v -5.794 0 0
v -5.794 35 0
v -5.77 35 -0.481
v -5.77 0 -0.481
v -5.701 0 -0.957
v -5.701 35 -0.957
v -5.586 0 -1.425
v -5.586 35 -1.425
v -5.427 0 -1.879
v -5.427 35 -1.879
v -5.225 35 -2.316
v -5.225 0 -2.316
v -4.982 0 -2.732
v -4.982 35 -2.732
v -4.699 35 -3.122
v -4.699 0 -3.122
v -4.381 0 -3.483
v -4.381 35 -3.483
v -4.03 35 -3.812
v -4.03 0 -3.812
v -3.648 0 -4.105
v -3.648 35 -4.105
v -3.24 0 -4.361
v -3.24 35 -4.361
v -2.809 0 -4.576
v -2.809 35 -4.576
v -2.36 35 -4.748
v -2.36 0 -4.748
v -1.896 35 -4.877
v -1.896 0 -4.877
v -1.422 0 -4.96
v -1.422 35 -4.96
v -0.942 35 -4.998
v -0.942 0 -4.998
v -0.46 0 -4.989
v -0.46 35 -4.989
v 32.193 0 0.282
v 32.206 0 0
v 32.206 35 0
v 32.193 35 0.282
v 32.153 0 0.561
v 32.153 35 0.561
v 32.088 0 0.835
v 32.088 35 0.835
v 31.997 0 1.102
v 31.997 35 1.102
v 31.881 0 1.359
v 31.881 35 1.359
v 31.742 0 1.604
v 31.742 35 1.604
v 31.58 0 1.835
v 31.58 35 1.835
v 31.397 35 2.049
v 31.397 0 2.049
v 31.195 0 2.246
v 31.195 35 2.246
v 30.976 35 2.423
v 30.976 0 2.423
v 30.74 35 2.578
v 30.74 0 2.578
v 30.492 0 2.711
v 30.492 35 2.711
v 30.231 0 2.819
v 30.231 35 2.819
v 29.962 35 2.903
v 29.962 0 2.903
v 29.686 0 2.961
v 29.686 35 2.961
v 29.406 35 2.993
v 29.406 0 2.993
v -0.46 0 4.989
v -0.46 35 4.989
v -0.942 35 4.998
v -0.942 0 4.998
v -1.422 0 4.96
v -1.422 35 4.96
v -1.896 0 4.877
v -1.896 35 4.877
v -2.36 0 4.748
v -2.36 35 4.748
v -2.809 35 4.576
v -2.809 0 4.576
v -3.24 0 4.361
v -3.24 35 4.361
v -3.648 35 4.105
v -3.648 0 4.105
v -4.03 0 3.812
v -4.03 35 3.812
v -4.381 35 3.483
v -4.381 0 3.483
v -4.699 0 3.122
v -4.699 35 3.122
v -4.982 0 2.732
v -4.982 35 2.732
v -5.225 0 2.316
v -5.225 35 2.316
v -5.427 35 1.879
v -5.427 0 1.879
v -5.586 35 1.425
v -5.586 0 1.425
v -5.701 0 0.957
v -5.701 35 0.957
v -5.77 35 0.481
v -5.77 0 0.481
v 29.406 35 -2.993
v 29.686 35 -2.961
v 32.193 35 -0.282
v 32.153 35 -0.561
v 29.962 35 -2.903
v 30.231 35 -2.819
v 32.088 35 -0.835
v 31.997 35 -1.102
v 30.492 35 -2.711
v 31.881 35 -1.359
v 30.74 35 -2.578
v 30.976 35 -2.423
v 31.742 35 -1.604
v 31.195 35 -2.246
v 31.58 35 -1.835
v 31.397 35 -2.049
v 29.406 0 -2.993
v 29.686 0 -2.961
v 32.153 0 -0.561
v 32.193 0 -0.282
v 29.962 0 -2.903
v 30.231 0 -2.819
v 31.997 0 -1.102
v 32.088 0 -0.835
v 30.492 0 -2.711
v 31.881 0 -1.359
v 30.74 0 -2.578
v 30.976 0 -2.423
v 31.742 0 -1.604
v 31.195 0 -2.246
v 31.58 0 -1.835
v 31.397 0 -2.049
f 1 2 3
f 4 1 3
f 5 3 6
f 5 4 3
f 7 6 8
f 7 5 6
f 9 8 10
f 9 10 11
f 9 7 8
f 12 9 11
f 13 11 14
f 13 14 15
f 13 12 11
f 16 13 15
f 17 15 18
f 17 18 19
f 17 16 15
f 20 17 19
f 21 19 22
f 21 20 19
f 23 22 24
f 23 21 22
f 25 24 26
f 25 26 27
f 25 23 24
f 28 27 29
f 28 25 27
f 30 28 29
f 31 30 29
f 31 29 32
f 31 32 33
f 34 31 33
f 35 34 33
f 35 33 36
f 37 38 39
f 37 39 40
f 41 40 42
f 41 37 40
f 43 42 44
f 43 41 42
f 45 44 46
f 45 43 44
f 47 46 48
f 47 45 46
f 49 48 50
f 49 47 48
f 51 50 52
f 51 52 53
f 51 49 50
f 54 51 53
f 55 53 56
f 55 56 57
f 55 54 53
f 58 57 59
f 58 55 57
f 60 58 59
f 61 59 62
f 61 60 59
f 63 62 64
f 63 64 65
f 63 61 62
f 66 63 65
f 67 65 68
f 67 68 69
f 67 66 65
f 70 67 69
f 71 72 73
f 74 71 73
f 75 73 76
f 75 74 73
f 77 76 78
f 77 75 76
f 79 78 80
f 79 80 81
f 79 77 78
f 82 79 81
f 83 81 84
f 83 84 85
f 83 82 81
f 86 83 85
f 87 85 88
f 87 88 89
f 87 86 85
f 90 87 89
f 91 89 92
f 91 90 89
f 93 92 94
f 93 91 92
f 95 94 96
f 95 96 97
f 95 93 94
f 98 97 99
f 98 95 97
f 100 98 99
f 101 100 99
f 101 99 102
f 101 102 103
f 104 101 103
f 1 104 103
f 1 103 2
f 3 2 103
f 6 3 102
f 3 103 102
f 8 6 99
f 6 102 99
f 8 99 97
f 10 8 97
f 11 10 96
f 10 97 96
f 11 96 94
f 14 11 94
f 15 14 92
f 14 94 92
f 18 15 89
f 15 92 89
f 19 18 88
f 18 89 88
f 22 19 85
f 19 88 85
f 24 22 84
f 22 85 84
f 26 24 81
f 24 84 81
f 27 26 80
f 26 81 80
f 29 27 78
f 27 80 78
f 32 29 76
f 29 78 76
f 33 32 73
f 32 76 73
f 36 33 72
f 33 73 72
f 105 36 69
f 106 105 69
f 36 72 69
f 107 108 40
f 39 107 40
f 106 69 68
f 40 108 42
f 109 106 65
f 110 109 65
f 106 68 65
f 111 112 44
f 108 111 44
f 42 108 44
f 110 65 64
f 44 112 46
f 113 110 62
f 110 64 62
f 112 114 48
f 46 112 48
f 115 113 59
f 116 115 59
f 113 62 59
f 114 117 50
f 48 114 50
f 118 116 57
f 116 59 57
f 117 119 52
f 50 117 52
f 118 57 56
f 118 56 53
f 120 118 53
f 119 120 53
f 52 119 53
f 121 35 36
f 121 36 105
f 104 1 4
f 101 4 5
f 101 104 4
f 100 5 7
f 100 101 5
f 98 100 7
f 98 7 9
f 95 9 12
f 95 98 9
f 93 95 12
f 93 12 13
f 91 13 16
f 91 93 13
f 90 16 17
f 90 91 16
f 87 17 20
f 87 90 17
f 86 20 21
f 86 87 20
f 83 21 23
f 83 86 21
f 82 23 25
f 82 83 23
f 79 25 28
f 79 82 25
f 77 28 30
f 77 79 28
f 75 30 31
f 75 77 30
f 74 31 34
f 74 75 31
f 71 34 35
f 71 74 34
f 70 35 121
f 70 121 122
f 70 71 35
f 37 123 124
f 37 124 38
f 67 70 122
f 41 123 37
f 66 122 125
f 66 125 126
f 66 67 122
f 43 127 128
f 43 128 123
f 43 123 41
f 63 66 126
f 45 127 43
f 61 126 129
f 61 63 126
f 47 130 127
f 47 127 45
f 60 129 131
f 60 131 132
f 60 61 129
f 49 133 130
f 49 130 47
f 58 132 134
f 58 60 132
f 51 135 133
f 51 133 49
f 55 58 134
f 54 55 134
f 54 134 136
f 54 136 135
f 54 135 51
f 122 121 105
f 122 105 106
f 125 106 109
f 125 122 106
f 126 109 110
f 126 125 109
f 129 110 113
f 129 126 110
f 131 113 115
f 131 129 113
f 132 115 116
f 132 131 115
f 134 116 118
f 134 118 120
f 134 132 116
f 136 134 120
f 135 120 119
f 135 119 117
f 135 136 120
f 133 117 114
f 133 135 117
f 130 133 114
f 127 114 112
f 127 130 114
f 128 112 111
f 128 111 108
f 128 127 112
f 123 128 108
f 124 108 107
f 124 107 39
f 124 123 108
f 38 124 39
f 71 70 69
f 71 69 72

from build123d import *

# Parameters (mm, degrees)
F1_DEPTH = 35


with BuildPart() as f1:
    # F0 (on Front) → F1 (new body)
    with BuildSketch(Plane.XZ):
        with BuildLine():
            Line((6.706351, 0), (3.206351, 0))
            ThreePointArc((3.206351, 0), (4.315396, -2.556039), (6.939684, -3.492214))
            Line((6.939684, -3.492214), (29.339684, -1.995551))
            ThreePointArc((29.339684, -1.995551), (30.666944, -1.36626), (31.206351, 0))
            Line((31.206351, 0), (29.206351, 0))
            Line((29.206351, 0), (6.706351, 0))
        make_face()
        with BuildLine():
            ThreePointArc((6.939684, 3.492214), (4.315396, 2.556039), (3.206351, 0))
            Line((3.206351, 0), (6.706351, 0))
            Line((6.706351, 0), (29.206351, 0))
            Line((29.206351, 0), (31.206351, 0))
            ThreePointArc((31.206351, 0), (30.666944, 1.36626), (29.339684, 1.995551))
            Line((29.339684, 1.995551), (6.939684, 3.492214))
        make_face()
        with BuildLine():
            Line((-0.793649, 0), (-5.793649, 0))
            ThreePointArc((-5.793649, 0), (-4.209299, -3.651484), (-0.460316, -4.988877))
            Line((-0.460316, -4.988877), (29.406351, -2.993326))
            ThreePointArc((29.406351, -2.993326), (31.397241, -2.04939), (32.206351, 0))
            Line((32.206351, 0), (31.206351, 0))
            ThreePointArc((31.206351, 0), (30.666944, -1.36626), (29.339684, -1.995551))
            Line((29.339684, -1.995551), (6.939684, -3.492214))
            ThreePointArc((6.939684, -3.492214), (4.315396, -2.556039), (3.206351, 0))
            Line((3.206351, 0), (-0.793649, 0))
        make_face()
        with BuildLine():
            ThreePointArc((-0.460316, 4.988877), (-4.209299, 3.651484), (-5.793649, 0))
            Line((-5.793649, 0), (-0.793649, 0))
            Line((-0.793649, 0), (3.206351, 0))
            ThreePointArc((3.206351, 0), (4.315396, 2.556039), (6.939684, 3.492214))
            Line((6.939684, 3.492214), (29.339684, 1.995551))
            ThreePointArc((29.339684, 1.995551), (30.666944, 1.36626), (31.206351, 0))
            Line((31.206351, 0), (32.206351, 0))
            ThreePointArc((32.206351, 0), (31.397241, 2.04939), (29.406351, 2.993326))
            Line((29.406351, 2.993326), (-0.460316, 4.988877))
        make_face()
    extrude(amount=-F1_DEPTH)


solid = f1.part
